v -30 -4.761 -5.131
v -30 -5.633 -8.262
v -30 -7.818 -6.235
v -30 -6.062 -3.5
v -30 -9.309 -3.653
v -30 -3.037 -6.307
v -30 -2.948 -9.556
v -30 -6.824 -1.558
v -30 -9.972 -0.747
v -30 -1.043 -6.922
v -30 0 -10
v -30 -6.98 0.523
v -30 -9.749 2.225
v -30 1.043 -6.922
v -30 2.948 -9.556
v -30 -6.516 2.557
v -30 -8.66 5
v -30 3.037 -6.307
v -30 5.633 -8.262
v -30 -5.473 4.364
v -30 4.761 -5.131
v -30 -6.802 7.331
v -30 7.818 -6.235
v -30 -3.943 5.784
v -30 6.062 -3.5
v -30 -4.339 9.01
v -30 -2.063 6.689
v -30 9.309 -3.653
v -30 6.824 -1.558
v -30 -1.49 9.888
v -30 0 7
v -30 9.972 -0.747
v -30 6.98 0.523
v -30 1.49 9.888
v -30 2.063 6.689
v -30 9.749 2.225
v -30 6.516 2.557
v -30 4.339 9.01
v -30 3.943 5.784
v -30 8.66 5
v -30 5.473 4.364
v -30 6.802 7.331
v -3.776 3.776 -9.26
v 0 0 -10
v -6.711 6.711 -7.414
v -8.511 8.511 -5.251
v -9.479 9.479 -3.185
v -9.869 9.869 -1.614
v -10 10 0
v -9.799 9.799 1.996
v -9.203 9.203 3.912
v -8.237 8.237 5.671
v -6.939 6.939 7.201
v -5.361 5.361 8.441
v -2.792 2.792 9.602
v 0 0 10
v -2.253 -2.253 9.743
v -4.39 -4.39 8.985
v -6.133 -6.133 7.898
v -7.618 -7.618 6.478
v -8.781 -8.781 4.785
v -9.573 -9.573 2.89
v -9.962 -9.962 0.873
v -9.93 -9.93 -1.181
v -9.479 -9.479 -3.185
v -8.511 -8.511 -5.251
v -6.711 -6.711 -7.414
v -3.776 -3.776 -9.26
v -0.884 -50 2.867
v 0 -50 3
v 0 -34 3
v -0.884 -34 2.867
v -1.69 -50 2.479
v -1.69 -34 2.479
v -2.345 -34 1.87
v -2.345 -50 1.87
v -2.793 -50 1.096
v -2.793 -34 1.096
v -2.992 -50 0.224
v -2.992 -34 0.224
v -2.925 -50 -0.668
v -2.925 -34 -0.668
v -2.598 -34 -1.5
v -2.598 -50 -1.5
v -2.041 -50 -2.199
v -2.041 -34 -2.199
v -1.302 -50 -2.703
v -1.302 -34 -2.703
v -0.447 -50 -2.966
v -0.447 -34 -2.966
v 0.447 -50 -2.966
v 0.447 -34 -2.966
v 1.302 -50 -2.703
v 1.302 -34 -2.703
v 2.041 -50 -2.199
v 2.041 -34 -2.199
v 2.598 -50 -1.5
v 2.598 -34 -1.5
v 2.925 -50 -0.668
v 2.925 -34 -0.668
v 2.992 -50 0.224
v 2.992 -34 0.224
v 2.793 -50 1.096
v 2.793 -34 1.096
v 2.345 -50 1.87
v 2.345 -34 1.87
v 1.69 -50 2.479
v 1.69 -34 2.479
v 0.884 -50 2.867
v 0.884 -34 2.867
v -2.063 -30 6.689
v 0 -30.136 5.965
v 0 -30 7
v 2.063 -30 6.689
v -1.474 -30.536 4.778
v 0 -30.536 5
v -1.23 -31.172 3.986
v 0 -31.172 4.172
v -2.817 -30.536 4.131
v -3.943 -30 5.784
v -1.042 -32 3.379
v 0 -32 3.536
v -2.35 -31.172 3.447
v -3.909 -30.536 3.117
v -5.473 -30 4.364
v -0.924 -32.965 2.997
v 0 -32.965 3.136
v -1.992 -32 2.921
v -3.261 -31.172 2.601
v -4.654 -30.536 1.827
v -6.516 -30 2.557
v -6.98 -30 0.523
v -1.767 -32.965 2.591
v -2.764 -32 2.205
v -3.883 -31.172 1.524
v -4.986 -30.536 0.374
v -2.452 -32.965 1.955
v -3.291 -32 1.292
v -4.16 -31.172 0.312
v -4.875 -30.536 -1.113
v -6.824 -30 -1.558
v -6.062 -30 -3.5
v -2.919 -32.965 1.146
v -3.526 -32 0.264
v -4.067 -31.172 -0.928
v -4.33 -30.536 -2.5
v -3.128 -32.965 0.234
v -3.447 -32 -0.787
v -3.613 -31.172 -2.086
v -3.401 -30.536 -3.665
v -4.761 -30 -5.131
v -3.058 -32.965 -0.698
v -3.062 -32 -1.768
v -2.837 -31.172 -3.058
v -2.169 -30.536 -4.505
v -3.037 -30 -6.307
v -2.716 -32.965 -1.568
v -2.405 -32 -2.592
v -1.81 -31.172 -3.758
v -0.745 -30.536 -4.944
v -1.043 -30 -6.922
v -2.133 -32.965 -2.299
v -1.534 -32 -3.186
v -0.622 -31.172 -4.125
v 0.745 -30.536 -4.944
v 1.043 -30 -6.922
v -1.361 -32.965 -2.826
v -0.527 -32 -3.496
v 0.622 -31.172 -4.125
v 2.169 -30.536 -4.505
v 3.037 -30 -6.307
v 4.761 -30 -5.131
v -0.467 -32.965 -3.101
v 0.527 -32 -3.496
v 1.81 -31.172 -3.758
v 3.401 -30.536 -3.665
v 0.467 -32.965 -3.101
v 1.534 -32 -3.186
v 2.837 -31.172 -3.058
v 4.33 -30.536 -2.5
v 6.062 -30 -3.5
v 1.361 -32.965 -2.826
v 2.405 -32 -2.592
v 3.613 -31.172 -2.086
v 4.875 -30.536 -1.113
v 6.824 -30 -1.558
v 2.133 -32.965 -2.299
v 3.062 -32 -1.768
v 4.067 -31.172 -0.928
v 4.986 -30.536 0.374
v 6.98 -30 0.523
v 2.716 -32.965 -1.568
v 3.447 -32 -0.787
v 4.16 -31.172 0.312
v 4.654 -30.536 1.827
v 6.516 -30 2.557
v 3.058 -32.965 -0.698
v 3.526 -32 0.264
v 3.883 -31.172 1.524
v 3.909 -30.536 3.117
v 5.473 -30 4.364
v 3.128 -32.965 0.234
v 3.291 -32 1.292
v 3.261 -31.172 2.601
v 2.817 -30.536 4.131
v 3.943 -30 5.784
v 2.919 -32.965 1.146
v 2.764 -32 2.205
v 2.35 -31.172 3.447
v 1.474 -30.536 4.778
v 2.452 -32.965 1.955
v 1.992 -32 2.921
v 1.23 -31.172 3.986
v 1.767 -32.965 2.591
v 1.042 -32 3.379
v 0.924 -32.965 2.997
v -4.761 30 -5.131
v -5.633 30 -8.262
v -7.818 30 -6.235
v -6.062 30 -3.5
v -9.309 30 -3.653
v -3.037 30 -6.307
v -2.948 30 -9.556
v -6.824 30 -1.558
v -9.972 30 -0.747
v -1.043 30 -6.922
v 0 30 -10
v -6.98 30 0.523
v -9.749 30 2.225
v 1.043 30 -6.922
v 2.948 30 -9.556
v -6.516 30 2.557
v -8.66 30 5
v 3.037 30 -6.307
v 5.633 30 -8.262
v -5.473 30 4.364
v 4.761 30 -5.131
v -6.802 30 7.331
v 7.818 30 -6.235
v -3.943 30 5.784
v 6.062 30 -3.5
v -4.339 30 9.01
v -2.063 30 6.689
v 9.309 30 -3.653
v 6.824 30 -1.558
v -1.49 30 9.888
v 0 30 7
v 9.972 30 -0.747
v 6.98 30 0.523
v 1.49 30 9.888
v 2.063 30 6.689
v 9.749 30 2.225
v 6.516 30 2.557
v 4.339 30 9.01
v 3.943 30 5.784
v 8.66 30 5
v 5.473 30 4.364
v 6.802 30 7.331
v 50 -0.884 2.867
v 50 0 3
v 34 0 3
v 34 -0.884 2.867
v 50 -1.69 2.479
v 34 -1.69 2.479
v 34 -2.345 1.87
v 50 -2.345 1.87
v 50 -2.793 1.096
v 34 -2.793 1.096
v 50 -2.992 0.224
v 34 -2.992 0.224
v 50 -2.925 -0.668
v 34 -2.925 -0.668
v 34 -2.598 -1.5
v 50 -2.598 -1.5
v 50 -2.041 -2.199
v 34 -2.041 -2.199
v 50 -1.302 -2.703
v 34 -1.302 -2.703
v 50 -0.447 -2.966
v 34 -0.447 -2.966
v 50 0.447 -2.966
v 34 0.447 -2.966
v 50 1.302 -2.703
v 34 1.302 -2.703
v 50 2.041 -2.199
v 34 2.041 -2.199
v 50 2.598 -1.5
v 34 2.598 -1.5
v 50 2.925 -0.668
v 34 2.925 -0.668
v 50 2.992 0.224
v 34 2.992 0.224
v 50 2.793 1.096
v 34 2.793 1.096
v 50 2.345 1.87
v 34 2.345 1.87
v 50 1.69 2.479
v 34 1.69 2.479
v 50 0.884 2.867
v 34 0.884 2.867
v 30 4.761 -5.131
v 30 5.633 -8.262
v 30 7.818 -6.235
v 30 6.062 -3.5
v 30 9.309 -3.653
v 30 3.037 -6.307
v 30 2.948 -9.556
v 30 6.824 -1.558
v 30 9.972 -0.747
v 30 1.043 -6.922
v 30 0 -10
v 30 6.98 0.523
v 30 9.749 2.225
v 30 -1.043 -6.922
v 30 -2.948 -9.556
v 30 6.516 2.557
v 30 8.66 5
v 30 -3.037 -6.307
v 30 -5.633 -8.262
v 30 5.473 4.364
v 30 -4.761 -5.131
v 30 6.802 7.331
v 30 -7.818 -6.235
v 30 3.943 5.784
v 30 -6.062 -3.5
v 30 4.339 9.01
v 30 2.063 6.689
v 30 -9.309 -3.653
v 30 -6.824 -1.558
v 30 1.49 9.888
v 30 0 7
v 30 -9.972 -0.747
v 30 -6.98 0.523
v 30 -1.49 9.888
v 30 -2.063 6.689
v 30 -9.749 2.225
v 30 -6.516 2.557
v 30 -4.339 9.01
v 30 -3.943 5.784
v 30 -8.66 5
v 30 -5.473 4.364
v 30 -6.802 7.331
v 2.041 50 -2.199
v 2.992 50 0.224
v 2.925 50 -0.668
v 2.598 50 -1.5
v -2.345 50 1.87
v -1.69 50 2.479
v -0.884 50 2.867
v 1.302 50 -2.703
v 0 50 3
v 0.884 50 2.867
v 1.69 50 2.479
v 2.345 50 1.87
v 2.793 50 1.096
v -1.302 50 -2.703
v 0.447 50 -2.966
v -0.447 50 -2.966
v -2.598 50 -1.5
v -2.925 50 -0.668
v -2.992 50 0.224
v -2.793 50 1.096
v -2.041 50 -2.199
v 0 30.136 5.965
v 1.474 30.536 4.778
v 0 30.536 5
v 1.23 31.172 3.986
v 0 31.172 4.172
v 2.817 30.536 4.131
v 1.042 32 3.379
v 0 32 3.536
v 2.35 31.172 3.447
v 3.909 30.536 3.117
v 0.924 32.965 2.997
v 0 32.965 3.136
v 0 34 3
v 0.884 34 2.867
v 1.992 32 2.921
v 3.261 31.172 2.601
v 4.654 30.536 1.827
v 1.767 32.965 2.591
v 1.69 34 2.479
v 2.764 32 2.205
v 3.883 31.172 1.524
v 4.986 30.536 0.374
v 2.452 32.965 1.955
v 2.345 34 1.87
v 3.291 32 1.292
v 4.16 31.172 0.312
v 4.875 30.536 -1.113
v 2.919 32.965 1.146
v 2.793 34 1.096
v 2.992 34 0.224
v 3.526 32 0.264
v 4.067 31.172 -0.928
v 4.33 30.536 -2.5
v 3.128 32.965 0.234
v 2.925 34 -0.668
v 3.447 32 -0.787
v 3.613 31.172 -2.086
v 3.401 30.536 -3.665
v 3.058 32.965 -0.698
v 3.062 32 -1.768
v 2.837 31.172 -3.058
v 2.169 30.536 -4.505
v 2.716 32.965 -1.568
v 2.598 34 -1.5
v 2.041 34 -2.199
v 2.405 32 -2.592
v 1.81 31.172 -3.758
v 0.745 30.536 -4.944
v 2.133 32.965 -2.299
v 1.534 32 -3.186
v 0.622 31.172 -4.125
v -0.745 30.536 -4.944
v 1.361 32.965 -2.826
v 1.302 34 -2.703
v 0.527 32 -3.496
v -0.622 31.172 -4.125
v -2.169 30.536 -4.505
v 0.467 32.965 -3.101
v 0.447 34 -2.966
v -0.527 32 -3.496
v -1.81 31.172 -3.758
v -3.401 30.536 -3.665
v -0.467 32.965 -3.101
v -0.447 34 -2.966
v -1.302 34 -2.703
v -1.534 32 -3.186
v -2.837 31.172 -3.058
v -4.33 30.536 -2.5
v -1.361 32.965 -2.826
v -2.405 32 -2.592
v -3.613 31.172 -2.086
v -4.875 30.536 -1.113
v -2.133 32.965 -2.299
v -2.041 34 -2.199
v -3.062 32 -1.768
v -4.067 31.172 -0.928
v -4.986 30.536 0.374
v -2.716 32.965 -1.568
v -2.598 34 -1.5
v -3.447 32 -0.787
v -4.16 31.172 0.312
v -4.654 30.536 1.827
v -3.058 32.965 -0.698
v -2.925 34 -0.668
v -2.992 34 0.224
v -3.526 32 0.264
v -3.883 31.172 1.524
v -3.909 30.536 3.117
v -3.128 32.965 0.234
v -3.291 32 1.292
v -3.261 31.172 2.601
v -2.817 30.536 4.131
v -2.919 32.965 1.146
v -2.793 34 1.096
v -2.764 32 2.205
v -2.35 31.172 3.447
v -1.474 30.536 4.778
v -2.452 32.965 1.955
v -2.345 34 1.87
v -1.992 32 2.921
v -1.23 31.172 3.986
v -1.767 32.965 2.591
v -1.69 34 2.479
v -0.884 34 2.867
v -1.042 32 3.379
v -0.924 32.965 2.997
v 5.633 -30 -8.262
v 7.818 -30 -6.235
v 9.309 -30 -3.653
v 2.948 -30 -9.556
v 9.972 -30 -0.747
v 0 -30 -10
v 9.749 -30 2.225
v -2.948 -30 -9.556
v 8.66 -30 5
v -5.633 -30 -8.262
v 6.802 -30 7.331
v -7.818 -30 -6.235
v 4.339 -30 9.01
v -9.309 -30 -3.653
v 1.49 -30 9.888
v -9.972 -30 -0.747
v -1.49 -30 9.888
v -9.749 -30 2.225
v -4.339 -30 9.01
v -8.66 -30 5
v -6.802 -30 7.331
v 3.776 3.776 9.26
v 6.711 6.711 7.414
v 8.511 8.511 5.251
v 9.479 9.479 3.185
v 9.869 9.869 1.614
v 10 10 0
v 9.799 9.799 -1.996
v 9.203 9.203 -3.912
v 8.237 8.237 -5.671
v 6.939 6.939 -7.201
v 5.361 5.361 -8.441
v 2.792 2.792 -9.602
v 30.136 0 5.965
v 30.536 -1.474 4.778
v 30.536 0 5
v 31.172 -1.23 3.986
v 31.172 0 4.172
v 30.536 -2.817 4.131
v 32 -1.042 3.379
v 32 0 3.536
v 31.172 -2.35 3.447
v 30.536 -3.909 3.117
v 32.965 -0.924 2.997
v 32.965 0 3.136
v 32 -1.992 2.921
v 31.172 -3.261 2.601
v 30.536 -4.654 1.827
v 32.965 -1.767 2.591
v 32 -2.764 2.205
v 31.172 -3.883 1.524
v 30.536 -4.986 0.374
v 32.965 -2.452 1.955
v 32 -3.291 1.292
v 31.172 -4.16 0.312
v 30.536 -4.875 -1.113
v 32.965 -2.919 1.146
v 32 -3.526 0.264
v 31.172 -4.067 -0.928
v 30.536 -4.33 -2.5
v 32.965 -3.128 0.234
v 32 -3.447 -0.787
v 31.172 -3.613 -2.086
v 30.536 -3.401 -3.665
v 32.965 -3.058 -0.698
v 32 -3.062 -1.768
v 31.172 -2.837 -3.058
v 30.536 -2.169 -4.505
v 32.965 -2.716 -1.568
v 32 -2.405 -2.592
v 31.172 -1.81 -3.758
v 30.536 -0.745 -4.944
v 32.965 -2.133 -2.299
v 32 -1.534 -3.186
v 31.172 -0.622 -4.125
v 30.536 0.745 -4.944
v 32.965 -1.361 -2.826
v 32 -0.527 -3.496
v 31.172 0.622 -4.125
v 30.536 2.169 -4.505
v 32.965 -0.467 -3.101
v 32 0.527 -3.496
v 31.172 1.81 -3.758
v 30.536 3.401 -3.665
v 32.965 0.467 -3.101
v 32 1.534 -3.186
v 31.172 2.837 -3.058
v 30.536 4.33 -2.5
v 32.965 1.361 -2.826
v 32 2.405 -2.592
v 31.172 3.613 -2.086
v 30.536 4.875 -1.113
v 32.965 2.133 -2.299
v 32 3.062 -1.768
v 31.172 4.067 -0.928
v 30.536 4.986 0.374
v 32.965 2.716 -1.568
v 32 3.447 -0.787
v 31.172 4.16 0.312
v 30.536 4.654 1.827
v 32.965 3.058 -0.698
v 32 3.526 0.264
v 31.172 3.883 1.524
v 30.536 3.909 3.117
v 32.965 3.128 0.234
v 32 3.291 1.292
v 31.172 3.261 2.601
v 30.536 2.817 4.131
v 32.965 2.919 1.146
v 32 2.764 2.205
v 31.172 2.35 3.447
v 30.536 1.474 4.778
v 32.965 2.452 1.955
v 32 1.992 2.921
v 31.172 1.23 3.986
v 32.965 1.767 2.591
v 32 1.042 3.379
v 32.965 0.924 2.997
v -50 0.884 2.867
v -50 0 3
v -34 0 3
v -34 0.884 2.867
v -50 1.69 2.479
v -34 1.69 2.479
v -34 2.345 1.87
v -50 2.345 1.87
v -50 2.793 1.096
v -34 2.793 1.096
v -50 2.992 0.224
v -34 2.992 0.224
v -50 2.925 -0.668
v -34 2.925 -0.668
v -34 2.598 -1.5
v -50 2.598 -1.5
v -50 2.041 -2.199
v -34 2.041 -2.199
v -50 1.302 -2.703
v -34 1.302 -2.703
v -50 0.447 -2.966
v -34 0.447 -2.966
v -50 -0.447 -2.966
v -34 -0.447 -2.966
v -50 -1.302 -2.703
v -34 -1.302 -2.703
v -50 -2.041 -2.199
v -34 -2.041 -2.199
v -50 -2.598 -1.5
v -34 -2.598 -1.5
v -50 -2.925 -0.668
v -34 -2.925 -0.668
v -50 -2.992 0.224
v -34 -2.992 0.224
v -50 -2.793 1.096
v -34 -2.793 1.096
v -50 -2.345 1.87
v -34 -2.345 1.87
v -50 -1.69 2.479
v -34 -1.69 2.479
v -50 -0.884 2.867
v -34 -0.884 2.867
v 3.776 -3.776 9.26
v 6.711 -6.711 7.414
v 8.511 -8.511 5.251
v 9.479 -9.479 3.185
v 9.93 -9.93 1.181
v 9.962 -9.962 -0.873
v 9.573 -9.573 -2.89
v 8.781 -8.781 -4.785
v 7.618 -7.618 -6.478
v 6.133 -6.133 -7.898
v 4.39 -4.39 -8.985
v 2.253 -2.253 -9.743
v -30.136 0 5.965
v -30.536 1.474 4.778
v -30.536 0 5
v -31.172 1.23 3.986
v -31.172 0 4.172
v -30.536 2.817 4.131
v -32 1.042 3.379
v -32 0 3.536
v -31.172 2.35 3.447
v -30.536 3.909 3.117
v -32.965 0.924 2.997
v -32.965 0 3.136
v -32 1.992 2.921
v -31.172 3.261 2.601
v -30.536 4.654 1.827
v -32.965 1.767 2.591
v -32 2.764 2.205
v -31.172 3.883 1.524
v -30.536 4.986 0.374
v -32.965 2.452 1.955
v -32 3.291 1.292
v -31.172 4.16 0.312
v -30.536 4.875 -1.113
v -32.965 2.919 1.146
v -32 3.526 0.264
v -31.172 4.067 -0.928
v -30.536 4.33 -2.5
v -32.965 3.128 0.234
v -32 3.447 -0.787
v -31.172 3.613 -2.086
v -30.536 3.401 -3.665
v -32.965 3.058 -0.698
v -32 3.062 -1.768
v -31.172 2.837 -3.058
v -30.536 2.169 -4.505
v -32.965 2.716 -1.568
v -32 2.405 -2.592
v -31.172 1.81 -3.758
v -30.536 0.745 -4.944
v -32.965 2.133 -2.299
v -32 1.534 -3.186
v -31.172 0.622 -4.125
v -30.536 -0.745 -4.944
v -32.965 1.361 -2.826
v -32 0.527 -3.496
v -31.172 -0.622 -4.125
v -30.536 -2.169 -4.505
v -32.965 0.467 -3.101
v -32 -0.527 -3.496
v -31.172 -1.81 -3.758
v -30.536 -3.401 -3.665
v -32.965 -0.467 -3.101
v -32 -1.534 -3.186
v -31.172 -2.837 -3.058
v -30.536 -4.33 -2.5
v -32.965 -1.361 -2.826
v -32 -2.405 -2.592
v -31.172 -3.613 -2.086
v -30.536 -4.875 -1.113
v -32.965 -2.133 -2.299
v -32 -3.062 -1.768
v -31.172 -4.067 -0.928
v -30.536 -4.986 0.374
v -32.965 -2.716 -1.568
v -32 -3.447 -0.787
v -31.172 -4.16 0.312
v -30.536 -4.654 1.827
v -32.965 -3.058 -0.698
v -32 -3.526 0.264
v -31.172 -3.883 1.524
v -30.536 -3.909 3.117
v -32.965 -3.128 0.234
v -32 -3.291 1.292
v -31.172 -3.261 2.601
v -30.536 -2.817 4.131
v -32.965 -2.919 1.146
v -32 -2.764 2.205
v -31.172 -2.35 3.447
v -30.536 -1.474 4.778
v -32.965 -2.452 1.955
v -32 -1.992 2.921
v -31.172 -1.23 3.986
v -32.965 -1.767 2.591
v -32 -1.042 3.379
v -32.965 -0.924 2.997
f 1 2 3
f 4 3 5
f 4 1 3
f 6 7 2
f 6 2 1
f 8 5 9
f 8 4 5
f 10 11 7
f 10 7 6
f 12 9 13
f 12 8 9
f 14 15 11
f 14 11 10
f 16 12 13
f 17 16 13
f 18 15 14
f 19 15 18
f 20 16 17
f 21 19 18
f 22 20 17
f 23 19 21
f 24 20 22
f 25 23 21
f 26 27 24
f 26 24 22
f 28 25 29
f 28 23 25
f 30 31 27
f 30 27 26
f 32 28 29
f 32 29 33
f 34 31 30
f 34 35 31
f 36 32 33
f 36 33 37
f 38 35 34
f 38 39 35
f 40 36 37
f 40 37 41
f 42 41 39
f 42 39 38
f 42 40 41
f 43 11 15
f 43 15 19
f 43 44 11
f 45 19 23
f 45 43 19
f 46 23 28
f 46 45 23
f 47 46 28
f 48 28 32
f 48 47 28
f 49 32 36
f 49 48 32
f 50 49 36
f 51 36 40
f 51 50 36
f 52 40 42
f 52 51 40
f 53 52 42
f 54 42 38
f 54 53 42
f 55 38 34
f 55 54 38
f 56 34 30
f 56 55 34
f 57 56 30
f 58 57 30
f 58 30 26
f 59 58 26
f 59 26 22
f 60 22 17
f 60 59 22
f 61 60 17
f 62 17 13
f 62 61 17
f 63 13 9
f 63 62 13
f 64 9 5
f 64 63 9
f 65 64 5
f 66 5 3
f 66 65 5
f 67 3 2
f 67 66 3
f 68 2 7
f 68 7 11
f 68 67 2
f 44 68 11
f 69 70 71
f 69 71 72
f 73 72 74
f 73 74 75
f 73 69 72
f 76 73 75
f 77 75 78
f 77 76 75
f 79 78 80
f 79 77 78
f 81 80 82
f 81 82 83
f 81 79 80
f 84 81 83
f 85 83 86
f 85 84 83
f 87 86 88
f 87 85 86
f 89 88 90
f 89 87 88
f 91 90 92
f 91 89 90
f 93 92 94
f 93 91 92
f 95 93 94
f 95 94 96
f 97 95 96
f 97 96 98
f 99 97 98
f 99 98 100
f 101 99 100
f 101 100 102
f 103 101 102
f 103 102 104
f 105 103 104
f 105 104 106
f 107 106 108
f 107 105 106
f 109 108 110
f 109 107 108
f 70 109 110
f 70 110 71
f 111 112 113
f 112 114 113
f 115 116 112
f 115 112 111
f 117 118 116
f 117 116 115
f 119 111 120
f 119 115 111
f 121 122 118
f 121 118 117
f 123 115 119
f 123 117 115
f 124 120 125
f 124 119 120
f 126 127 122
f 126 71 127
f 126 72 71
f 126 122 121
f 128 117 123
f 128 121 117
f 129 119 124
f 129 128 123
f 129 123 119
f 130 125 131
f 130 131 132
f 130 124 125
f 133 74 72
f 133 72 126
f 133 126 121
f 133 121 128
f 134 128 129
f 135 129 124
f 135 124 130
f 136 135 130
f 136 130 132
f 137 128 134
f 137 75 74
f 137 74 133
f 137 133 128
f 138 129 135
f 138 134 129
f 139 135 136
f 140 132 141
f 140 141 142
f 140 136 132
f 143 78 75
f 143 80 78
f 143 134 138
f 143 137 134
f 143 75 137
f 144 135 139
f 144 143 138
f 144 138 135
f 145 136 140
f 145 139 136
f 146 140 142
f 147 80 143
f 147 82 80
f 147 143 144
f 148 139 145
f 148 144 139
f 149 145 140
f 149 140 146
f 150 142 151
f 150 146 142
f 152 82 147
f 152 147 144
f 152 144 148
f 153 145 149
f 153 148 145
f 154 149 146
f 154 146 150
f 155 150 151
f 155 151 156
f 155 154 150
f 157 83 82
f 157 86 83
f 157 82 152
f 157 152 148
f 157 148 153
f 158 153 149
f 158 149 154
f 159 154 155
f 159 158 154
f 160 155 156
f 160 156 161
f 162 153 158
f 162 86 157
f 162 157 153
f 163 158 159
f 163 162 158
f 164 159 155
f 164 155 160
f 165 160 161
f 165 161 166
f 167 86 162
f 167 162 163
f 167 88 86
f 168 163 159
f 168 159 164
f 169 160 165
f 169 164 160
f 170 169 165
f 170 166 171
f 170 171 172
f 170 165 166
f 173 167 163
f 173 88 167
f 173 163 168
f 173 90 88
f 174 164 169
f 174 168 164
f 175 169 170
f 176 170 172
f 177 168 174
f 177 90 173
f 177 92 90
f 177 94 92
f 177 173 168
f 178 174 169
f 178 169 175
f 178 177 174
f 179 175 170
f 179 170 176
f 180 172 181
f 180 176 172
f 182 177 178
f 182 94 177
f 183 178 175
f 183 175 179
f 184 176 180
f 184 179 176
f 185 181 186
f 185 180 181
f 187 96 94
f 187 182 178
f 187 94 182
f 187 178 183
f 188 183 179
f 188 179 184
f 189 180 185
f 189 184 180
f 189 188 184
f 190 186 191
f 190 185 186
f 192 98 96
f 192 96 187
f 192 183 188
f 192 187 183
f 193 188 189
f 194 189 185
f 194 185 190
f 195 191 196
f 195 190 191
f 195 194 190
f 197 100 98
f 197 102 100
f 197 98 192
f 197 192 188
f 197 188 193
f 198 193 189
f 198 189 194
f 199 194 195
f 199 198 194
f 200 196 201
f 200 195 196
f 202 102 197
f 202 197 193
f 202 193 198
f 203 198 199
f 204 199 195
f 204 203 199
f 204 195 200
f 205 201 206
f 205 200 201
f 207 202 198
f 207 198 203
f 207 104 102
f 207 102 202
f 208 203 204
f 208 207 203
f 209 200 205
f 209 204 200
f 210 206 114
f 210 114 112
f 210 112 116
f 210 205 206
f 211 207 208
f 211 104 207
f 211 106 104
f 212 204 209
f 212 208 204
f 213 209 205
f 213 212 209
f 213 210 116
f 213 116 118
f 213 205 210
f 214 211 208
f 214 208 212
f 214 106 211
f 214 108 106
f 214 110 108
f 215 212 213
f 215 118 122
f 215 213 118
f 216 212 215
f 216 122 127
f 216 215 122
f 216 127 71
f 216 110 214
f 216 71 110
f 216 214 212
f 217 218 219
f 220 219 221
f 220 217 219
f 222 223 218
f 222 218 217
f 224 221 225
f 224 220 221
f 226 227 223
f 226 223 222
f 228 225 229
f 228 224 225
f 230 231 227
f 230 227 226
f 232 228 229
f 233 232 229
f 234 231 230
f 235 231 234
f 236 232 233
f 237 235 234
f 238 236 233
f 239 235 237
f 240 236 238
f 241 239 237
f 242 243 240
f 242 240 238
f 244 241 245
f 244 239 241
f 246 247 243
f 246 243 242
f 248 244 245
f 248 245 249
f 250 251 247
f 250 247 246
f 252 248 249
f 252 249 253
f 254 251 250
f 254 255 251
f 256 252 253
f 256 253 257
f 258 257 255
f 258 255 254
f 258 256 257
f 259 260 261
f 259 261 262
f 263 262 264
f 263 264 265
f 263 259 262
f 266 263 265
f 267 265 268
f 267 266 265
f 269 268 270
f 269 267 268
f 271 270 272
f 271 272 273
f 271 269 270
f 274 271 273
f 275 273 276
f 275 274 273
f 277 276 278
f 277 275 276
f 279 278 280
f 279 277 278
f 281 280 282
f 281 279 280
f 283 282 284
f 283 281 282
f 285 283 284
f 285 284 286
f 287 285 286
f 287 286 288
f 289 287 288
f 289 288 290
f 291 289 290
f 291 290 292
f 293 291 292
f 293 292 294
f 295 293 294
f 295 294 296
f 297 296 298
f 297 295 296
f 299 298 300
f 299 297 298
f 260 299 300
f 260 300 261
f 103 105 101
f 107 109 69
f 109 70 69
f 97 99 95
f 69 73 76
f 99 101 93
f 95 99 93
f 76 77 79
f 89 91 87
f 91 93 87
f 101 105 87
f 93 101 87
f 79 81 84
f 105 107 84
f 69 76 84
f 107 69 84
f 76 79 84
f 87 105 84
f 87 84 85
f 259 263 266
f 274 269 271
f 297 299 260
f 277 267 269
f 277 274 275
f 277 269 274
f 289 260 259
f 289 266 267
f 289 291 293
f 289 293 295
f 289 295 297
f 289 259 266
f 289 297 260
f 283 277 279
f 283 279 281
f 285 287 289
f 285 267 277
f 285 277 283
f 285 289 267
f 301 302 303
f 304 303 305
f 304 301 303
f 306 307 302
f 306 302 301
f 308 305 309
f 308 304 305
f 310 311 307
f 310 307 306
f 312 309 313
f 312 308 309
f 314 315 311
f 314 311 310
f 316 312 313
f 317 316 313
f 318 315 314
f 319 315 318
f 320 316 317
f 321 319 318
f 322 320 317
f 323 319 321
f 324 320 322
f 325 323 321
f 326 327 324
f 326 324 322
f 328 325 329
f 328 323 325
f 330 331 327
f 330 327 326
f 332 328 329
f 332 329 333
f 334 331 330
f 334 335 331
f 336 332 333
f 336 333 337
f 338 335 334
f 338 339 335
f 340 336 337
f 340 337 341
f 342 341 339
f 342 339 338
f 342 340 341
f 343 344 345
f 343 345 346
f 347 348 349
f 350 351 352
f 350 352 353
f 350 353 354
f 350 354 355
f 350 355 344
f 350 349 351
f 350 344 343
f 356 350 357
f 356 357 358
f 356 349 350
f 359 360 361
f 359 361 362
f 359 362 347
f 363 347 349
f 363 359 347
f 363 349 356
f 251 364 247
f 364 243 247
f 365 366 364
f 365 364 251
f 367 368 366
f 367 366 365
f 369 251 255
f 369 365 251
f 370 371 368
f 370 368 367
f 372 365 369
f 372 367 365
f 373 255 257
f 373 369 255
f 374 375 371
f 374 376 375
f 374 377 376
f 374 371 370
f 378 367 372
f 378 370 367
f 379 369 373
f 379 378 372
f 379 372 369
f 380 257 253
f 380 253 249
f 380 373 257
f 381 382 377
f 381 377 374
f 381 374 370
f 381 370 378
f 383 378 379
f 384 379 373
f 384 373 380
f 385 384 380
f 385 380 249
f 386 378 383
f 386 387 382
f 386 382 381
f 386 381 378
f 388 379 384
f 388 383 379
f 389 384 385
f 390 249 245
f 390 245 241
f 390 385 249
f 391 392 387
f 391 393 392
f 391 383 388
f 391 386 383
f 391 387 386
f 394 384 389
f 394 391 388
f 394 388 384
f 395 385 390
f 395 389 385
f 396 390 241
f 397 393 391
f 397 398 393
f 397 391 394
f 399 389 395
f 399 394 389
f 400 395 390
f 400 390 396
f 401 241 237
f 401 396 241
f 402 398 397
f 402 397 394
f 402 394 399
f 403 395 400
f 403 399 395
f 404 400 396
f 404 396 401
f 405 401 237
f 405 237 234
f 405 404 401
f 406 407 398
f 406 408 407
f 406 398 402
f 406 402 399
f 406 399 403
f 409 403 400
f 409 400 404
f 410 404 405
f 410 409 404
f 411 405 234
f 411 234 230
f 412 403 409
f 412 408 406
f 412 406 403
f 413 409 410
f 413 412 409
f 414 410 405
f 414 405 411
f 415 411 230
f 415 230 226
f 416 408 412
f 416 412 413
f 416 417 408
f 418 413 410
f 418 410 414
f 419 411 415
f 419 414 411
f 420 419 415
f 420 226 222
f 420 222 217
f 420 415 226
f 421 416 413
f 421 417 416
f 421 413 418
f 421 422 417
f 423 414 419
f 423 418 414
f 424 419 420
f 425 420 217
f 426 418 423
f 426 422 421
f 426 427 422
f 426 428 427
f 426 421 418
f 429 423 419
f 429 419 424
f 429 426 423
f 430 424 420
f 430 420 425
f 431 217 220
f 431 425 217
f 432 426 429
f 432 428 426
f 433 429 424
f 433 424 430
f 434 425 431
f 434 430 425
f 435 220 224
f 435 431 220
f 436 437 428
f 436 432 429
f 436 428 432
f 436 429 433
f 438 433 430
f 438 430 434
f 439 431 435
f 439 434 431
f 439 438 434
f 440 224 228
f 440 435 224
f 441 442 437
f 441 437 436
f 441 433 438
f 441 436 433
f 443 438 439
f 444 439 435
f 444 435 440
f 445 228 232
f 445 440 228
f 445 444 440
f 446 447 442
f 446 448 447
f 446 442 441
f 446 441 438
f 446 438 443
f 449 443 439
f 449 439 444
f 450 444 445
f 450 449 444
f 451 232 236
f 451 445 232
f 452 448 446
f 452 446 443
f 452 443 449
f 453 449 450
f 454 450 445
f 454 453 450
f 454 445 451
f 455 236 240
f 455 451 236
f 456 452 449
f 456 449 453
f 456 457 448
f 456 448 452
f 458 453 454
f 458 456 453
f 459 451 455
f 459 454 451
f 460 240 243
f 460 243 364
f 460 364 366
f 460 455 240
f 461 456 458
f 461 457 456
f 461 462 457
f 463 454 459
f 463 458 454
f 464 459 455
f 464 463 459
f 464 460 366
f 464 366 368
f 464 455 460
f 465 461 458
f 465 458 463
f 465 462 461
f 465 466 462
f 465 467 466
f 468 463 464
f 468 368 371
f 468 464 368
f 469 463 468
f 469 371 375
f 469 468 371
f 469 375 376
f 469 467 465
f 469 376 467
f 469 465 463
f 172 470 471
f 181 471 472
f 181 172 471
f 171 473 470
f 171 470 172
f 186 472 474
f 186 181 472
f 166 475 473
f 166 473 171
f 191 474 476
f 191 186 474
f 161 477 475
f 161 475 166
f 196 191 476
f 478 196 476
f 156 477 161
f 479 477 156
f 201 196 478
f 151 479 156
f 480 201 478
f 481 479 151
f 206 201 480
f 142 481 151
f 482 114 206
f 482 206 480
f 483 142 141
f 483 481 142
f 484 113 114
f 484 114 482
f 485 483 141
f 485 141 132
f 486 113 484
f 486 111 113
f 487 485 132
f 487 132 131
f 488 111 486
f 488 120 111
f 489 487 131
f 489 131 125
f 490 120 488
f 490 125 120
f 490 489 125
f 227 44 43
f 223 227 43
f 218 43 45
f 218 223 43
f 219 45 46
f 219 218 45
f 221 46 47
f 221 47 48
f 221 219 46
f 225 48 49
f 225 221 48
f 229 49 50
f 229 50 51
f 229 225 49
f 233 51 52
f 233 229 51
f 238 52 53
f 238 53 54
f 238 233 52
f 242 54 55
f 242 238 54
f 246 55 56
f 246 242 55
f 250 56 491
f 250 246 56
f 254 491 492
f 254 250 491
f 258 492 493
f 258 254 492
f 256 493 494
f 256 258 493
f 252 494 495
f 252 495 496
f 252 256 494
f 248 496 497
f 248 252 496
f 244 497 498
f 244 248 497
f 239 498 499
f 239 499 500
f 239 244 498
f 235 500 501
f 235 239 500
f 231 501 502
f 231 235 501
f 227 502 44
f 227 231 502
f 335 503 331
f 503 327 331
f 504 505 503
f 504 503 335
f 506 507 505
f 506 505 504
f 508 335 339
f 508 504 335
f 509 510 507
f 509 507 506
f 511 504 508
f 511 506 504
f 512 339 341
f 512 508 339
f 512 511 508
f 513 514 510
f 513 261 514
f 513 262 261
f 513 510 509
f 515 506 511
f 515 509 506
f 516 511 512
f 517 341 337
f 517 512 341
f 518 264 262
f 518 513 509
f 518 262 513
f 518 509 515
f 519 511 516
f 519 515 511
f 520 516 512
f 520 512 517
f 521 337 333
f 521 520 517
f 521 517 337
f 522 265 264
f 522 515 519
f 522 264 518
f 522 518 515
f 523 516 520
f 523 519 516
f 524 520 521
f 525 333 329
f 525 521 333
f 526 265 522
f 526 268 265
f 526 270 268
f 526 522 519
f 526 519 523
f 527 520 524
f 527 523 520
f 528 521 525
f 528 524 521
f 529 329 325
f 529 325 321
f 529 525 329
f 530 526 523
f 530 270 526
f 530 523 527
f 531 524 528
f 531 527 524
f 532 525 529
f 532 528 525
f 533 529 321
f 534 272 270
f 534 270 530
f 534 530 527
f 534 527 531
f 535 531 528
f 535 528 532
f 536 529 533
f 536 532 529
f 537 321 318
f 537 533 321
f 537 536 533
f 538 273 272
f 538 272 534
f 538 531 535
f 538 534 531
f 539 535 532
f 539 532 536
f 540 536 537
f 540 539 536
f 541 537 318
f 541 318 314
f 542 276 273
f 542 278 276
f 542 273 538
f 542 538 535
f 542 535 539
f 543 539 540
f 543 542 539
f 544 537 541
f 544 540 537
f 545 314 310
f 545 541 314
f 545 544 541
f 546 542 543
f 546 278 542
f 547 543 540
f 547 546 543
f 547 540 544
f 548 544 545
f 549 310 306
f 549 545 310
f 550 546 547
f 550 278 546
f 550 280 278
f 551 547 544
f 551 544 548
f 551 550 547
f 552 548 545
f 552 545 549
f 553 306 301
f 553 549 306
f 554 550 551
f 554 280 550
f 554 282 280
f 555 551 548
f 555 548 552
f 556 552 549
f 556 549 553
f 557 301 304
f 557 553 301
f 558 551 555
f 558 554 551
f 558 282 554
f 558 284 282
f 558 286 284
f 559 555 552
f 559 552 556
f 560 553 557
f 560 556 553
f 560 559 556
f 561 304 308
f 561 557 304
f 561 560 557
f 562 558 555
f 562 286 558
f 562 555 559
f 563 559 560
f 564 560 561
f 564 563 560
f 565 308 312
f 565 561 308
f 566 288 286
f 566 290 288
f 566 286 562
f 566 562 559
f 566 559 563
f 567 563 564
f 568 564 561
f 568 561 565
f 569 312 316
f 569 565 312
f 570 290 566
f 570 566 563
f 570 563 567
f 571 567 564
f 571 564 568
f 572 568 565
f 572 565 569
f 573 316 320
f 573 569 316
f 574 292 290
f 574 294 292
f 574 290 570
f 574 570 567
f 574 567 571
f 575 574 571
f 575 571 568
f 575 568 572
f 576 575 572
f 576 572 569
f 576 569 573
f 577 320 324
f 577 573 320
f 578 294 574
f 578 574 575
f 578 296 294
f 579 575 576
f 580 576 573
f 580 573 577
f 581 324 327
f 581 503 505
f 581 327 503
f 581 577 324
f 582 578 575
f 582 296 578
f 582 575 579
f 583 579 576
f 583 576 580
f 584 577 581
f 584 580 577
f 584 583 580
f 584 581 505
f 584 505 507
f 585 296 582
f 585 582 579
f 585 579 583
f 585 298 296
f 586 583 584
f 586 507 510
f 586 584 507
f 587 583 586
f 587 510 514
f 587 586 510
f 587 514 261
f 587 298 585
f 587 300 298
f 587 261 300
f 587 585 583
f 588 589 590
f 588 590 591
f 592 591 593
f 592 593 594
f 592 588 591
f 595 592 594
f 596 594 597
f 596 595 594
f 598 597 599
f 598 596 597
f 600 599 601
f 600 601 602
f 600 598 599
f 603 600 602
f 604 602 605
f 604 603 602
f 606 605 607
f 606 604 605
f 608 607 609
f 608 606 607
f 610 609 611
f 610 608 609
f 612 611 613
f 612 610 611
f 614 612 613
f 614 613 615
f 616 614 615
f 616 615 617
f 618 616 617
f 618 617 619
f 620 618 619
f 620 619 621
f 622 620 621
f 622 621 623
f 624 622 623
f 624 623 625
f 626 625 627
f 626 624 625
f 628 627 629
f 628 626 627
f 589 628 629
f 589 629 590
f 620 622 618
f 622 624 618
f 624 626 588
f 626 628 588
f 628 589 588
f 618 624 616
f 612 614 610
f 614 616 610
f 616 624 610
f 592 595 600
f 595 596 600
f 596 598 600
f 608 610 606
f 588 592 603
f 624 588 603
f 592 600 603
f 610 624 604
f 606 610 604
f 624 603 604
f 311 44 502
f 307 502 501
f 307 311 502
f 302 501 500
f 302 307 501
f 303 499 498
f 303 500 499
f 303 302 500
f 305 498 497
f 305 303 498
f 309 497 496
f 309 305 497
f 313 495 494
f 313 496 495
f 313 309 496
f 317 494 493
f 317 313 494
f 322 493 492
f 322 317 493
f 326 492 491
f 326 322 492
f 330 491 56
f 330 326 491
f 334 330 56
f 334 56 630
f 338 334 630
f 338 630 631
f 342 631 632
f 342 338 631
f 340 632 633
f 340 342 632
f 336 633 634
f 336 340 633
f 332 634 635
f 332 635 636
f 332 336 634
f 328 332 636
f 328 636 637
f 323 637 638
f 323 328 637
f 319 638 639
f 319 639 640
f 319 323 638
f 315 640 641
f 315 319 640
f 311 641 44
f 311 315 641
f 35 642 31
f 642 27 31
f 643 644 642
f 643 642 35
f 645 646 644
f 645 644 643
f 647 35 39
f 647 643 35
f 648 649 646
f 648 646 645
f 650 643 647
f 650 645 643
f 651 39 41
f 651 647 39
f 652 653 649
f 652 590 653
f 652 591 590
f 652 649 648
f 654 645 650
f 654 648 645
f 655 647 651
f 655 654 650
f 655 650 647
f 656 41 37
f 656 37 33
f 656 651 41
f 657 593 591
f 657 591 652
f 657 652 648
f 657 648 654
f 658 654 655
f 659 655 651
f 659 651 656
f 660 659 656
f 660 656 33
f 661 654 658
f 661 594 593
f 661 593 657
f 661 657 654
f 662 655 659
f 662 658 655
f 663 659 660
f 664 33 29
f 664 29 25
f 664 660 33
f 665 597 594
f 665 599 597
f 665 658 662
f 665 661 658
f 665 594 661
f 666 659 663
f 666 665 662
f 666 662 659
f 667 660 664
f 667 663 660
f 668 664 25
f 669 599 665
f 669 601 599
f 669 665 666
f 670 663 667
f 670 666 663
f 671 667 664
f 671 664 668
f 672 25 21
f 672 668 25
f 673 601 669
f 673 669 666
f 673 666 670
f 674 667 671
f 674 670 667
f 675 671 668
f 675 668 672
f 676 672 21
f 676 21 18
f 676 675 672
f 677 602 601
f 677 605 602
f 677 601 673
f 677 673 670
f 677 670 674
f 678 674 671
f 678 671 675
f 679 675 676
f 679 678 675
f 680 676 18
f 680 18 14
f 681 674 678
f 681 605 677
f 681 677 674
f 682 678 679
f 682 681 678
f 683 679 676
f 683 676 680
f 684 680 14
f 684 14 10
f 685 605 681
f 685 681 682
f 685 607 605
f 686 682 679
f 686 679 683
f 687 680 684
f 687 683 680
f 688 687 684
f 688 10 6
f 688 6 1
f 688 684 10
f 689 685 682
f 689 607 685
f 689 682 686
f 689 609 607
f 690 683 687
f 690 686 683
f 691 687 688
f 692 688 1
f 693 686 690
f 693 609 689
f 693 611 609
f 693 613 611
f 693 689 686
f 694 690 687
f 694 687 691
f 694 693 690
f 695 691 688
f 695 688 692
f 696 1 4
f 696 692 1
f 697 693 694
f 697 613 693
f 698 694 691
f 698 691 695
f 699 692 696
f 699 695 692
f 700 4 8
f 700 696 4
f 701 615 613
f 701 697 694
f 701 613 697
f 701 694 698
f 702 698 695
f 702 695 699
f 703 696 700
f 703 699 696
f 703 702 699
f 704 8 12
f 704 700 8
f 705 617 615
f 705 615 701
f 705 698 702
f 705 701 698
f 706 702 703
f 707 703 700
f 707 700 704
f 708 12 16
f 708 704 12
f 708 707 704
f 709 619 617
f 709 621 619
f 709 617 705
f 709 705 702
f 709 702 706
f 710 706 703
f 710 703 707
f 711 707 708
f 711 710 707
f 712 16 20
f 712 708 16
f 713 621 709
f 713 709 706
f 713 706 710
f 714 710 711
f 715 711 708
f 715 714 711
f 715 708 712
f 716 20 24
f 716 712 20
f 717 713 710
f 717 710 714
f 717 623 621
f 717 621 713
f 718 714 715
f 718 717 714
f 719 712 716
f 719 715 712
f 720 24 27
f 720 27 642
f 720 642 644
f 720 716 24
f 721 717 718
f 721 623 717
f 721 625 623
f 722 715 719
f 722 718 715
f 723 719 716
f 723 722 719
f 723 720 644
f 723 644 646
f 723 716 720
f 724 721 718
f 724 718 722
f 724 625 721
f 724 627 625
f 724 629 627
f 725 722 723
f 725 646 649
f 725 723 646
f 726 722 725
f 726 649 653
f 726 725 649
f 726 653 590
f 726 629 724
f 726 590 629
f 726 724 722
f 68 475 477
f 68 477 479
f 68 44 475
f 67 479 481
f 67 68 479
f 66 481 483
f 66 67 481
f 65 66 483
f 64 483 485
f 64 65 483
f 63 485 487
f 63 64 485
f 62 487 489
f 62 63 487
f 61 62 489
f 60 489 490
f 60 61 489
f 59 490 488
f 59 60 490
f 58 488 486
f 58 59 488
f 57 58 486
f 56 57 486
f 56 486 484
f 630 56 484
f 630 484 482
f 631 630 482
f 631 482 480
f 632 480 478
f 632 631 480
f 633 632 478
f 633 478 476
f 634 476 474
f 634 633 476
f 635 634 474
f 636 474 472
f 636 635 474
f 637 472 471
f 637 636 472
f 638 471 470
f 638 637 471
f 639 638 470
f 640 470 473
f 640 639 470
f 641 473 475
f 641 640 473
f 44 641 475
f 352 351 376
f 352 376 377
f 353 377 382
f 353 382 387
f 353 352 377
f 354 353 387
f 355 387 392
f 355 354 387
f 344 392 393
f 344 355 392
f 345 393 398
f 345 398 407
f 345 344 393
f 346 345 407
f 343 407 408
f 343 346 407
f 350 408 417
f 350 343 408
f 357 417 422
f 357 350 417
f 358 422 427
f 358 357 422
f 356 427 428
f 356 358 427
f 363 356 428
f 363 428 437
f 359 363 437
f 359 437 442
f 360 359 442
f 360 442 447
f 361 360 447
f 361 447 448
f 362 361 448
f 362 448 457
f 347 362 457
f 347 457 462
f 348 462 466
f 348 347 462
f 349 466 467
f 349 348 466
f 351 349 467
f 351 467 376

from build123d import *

# Parameters (mm, degrees)
SKETCH_1_R                       = 10
EXTRUDE_1_DEPTH                  = 50
SKETCH_2_R                       = 10
EXTRUDE_2_DEPTH                  = 50
SKETCH_3_OUTSIDE_W               = 50.566
SKETCH_3_OUTSIDE_H               = 130.566
SKETCH_3_OUTSIDE_R               = 3
CUT_EXTRUDE_1_DEPTH              = 20
FILLET_2_R                       = 4
PATTERN_CIRCULAR_1_COUNT         = 4
FILLET_2_OF_PATTERN_CIRCULAR_1_R = 4


with BuildPart() as part:
    # 草图1 → 凸台-拉伸1 (new, symmetric)
    with BuildSketch(Plane(origin=(0, 0, 0), x_dir=(1, 0, 0), z_dir=(0, 1, 0))):
        Circle(SKETCH_1_R)
    extrude(amount=EXTRUDE_1_DEPTH, both=True)

    # 草图2 → 凸台-拉伸2 (add, symmetric)
    with BuildSketch(Plane(origin=(0, 0, 0), x_dir=(0, 0, -1), z_dir=(1, 0, 0))):
        Circle(SKETCH_2_R)
    extrude(amount=EXTRUDE_2_DEPTH, both=True)

    # 草图3 outside → 切除-拉伸1 (cut)
    with BuildSketch(Plane.ZY.offset(50)):
        Rectangle(SKETCH_3_OUTSIDE_W, SKETCH_3_OUTSIDE_H)
        Circle(SKETCH_3_OUTSIDE_R, mode=Mode.SUBTRACT)
    cut_extrude_1 = extrude(amount=-CUT_EXTRUDE_1_DEPTH, mode=Mode.SUBTRACT)

    # 圆角2
    fillet_2_edges = [part.edges().sort_by_distance(p)[0] for p in [
        (-30, 0, -3),
    ]]
    fillet(fillet_2_edges, radius=FILLET_2_R)

    # 阵列(圆周)1: 切除-拉伸1 ×4 about axis
    pattern_circular_1_axis = Axis((0, 0, 11), (0, 0, -1))
    for i in range(1, PATTERN_CIRCULAR_1_COUNT):
        add(cut_extrude_1.rotate(pattern_circular_1_axis, i * 360 / PATTERN_CIRCULAR_1_COUNT), mode=Mode.SUBTRACT)

    # 圆角2 of 阵列(圆周)1
    fillet_2_of_pattern_circular_1_edges = [part.edges().sort_by_distance(p)[0] for p in [
        (0, 30, -3),
        (30, 0, -3),
        (0, -30, -3),
    ]]
    fillet(fillet_2_of_pattern_circular_1_edges, radius=FILLET_2_OF_PATTERN_CIRCULAR_1_R)


solid = part.part
